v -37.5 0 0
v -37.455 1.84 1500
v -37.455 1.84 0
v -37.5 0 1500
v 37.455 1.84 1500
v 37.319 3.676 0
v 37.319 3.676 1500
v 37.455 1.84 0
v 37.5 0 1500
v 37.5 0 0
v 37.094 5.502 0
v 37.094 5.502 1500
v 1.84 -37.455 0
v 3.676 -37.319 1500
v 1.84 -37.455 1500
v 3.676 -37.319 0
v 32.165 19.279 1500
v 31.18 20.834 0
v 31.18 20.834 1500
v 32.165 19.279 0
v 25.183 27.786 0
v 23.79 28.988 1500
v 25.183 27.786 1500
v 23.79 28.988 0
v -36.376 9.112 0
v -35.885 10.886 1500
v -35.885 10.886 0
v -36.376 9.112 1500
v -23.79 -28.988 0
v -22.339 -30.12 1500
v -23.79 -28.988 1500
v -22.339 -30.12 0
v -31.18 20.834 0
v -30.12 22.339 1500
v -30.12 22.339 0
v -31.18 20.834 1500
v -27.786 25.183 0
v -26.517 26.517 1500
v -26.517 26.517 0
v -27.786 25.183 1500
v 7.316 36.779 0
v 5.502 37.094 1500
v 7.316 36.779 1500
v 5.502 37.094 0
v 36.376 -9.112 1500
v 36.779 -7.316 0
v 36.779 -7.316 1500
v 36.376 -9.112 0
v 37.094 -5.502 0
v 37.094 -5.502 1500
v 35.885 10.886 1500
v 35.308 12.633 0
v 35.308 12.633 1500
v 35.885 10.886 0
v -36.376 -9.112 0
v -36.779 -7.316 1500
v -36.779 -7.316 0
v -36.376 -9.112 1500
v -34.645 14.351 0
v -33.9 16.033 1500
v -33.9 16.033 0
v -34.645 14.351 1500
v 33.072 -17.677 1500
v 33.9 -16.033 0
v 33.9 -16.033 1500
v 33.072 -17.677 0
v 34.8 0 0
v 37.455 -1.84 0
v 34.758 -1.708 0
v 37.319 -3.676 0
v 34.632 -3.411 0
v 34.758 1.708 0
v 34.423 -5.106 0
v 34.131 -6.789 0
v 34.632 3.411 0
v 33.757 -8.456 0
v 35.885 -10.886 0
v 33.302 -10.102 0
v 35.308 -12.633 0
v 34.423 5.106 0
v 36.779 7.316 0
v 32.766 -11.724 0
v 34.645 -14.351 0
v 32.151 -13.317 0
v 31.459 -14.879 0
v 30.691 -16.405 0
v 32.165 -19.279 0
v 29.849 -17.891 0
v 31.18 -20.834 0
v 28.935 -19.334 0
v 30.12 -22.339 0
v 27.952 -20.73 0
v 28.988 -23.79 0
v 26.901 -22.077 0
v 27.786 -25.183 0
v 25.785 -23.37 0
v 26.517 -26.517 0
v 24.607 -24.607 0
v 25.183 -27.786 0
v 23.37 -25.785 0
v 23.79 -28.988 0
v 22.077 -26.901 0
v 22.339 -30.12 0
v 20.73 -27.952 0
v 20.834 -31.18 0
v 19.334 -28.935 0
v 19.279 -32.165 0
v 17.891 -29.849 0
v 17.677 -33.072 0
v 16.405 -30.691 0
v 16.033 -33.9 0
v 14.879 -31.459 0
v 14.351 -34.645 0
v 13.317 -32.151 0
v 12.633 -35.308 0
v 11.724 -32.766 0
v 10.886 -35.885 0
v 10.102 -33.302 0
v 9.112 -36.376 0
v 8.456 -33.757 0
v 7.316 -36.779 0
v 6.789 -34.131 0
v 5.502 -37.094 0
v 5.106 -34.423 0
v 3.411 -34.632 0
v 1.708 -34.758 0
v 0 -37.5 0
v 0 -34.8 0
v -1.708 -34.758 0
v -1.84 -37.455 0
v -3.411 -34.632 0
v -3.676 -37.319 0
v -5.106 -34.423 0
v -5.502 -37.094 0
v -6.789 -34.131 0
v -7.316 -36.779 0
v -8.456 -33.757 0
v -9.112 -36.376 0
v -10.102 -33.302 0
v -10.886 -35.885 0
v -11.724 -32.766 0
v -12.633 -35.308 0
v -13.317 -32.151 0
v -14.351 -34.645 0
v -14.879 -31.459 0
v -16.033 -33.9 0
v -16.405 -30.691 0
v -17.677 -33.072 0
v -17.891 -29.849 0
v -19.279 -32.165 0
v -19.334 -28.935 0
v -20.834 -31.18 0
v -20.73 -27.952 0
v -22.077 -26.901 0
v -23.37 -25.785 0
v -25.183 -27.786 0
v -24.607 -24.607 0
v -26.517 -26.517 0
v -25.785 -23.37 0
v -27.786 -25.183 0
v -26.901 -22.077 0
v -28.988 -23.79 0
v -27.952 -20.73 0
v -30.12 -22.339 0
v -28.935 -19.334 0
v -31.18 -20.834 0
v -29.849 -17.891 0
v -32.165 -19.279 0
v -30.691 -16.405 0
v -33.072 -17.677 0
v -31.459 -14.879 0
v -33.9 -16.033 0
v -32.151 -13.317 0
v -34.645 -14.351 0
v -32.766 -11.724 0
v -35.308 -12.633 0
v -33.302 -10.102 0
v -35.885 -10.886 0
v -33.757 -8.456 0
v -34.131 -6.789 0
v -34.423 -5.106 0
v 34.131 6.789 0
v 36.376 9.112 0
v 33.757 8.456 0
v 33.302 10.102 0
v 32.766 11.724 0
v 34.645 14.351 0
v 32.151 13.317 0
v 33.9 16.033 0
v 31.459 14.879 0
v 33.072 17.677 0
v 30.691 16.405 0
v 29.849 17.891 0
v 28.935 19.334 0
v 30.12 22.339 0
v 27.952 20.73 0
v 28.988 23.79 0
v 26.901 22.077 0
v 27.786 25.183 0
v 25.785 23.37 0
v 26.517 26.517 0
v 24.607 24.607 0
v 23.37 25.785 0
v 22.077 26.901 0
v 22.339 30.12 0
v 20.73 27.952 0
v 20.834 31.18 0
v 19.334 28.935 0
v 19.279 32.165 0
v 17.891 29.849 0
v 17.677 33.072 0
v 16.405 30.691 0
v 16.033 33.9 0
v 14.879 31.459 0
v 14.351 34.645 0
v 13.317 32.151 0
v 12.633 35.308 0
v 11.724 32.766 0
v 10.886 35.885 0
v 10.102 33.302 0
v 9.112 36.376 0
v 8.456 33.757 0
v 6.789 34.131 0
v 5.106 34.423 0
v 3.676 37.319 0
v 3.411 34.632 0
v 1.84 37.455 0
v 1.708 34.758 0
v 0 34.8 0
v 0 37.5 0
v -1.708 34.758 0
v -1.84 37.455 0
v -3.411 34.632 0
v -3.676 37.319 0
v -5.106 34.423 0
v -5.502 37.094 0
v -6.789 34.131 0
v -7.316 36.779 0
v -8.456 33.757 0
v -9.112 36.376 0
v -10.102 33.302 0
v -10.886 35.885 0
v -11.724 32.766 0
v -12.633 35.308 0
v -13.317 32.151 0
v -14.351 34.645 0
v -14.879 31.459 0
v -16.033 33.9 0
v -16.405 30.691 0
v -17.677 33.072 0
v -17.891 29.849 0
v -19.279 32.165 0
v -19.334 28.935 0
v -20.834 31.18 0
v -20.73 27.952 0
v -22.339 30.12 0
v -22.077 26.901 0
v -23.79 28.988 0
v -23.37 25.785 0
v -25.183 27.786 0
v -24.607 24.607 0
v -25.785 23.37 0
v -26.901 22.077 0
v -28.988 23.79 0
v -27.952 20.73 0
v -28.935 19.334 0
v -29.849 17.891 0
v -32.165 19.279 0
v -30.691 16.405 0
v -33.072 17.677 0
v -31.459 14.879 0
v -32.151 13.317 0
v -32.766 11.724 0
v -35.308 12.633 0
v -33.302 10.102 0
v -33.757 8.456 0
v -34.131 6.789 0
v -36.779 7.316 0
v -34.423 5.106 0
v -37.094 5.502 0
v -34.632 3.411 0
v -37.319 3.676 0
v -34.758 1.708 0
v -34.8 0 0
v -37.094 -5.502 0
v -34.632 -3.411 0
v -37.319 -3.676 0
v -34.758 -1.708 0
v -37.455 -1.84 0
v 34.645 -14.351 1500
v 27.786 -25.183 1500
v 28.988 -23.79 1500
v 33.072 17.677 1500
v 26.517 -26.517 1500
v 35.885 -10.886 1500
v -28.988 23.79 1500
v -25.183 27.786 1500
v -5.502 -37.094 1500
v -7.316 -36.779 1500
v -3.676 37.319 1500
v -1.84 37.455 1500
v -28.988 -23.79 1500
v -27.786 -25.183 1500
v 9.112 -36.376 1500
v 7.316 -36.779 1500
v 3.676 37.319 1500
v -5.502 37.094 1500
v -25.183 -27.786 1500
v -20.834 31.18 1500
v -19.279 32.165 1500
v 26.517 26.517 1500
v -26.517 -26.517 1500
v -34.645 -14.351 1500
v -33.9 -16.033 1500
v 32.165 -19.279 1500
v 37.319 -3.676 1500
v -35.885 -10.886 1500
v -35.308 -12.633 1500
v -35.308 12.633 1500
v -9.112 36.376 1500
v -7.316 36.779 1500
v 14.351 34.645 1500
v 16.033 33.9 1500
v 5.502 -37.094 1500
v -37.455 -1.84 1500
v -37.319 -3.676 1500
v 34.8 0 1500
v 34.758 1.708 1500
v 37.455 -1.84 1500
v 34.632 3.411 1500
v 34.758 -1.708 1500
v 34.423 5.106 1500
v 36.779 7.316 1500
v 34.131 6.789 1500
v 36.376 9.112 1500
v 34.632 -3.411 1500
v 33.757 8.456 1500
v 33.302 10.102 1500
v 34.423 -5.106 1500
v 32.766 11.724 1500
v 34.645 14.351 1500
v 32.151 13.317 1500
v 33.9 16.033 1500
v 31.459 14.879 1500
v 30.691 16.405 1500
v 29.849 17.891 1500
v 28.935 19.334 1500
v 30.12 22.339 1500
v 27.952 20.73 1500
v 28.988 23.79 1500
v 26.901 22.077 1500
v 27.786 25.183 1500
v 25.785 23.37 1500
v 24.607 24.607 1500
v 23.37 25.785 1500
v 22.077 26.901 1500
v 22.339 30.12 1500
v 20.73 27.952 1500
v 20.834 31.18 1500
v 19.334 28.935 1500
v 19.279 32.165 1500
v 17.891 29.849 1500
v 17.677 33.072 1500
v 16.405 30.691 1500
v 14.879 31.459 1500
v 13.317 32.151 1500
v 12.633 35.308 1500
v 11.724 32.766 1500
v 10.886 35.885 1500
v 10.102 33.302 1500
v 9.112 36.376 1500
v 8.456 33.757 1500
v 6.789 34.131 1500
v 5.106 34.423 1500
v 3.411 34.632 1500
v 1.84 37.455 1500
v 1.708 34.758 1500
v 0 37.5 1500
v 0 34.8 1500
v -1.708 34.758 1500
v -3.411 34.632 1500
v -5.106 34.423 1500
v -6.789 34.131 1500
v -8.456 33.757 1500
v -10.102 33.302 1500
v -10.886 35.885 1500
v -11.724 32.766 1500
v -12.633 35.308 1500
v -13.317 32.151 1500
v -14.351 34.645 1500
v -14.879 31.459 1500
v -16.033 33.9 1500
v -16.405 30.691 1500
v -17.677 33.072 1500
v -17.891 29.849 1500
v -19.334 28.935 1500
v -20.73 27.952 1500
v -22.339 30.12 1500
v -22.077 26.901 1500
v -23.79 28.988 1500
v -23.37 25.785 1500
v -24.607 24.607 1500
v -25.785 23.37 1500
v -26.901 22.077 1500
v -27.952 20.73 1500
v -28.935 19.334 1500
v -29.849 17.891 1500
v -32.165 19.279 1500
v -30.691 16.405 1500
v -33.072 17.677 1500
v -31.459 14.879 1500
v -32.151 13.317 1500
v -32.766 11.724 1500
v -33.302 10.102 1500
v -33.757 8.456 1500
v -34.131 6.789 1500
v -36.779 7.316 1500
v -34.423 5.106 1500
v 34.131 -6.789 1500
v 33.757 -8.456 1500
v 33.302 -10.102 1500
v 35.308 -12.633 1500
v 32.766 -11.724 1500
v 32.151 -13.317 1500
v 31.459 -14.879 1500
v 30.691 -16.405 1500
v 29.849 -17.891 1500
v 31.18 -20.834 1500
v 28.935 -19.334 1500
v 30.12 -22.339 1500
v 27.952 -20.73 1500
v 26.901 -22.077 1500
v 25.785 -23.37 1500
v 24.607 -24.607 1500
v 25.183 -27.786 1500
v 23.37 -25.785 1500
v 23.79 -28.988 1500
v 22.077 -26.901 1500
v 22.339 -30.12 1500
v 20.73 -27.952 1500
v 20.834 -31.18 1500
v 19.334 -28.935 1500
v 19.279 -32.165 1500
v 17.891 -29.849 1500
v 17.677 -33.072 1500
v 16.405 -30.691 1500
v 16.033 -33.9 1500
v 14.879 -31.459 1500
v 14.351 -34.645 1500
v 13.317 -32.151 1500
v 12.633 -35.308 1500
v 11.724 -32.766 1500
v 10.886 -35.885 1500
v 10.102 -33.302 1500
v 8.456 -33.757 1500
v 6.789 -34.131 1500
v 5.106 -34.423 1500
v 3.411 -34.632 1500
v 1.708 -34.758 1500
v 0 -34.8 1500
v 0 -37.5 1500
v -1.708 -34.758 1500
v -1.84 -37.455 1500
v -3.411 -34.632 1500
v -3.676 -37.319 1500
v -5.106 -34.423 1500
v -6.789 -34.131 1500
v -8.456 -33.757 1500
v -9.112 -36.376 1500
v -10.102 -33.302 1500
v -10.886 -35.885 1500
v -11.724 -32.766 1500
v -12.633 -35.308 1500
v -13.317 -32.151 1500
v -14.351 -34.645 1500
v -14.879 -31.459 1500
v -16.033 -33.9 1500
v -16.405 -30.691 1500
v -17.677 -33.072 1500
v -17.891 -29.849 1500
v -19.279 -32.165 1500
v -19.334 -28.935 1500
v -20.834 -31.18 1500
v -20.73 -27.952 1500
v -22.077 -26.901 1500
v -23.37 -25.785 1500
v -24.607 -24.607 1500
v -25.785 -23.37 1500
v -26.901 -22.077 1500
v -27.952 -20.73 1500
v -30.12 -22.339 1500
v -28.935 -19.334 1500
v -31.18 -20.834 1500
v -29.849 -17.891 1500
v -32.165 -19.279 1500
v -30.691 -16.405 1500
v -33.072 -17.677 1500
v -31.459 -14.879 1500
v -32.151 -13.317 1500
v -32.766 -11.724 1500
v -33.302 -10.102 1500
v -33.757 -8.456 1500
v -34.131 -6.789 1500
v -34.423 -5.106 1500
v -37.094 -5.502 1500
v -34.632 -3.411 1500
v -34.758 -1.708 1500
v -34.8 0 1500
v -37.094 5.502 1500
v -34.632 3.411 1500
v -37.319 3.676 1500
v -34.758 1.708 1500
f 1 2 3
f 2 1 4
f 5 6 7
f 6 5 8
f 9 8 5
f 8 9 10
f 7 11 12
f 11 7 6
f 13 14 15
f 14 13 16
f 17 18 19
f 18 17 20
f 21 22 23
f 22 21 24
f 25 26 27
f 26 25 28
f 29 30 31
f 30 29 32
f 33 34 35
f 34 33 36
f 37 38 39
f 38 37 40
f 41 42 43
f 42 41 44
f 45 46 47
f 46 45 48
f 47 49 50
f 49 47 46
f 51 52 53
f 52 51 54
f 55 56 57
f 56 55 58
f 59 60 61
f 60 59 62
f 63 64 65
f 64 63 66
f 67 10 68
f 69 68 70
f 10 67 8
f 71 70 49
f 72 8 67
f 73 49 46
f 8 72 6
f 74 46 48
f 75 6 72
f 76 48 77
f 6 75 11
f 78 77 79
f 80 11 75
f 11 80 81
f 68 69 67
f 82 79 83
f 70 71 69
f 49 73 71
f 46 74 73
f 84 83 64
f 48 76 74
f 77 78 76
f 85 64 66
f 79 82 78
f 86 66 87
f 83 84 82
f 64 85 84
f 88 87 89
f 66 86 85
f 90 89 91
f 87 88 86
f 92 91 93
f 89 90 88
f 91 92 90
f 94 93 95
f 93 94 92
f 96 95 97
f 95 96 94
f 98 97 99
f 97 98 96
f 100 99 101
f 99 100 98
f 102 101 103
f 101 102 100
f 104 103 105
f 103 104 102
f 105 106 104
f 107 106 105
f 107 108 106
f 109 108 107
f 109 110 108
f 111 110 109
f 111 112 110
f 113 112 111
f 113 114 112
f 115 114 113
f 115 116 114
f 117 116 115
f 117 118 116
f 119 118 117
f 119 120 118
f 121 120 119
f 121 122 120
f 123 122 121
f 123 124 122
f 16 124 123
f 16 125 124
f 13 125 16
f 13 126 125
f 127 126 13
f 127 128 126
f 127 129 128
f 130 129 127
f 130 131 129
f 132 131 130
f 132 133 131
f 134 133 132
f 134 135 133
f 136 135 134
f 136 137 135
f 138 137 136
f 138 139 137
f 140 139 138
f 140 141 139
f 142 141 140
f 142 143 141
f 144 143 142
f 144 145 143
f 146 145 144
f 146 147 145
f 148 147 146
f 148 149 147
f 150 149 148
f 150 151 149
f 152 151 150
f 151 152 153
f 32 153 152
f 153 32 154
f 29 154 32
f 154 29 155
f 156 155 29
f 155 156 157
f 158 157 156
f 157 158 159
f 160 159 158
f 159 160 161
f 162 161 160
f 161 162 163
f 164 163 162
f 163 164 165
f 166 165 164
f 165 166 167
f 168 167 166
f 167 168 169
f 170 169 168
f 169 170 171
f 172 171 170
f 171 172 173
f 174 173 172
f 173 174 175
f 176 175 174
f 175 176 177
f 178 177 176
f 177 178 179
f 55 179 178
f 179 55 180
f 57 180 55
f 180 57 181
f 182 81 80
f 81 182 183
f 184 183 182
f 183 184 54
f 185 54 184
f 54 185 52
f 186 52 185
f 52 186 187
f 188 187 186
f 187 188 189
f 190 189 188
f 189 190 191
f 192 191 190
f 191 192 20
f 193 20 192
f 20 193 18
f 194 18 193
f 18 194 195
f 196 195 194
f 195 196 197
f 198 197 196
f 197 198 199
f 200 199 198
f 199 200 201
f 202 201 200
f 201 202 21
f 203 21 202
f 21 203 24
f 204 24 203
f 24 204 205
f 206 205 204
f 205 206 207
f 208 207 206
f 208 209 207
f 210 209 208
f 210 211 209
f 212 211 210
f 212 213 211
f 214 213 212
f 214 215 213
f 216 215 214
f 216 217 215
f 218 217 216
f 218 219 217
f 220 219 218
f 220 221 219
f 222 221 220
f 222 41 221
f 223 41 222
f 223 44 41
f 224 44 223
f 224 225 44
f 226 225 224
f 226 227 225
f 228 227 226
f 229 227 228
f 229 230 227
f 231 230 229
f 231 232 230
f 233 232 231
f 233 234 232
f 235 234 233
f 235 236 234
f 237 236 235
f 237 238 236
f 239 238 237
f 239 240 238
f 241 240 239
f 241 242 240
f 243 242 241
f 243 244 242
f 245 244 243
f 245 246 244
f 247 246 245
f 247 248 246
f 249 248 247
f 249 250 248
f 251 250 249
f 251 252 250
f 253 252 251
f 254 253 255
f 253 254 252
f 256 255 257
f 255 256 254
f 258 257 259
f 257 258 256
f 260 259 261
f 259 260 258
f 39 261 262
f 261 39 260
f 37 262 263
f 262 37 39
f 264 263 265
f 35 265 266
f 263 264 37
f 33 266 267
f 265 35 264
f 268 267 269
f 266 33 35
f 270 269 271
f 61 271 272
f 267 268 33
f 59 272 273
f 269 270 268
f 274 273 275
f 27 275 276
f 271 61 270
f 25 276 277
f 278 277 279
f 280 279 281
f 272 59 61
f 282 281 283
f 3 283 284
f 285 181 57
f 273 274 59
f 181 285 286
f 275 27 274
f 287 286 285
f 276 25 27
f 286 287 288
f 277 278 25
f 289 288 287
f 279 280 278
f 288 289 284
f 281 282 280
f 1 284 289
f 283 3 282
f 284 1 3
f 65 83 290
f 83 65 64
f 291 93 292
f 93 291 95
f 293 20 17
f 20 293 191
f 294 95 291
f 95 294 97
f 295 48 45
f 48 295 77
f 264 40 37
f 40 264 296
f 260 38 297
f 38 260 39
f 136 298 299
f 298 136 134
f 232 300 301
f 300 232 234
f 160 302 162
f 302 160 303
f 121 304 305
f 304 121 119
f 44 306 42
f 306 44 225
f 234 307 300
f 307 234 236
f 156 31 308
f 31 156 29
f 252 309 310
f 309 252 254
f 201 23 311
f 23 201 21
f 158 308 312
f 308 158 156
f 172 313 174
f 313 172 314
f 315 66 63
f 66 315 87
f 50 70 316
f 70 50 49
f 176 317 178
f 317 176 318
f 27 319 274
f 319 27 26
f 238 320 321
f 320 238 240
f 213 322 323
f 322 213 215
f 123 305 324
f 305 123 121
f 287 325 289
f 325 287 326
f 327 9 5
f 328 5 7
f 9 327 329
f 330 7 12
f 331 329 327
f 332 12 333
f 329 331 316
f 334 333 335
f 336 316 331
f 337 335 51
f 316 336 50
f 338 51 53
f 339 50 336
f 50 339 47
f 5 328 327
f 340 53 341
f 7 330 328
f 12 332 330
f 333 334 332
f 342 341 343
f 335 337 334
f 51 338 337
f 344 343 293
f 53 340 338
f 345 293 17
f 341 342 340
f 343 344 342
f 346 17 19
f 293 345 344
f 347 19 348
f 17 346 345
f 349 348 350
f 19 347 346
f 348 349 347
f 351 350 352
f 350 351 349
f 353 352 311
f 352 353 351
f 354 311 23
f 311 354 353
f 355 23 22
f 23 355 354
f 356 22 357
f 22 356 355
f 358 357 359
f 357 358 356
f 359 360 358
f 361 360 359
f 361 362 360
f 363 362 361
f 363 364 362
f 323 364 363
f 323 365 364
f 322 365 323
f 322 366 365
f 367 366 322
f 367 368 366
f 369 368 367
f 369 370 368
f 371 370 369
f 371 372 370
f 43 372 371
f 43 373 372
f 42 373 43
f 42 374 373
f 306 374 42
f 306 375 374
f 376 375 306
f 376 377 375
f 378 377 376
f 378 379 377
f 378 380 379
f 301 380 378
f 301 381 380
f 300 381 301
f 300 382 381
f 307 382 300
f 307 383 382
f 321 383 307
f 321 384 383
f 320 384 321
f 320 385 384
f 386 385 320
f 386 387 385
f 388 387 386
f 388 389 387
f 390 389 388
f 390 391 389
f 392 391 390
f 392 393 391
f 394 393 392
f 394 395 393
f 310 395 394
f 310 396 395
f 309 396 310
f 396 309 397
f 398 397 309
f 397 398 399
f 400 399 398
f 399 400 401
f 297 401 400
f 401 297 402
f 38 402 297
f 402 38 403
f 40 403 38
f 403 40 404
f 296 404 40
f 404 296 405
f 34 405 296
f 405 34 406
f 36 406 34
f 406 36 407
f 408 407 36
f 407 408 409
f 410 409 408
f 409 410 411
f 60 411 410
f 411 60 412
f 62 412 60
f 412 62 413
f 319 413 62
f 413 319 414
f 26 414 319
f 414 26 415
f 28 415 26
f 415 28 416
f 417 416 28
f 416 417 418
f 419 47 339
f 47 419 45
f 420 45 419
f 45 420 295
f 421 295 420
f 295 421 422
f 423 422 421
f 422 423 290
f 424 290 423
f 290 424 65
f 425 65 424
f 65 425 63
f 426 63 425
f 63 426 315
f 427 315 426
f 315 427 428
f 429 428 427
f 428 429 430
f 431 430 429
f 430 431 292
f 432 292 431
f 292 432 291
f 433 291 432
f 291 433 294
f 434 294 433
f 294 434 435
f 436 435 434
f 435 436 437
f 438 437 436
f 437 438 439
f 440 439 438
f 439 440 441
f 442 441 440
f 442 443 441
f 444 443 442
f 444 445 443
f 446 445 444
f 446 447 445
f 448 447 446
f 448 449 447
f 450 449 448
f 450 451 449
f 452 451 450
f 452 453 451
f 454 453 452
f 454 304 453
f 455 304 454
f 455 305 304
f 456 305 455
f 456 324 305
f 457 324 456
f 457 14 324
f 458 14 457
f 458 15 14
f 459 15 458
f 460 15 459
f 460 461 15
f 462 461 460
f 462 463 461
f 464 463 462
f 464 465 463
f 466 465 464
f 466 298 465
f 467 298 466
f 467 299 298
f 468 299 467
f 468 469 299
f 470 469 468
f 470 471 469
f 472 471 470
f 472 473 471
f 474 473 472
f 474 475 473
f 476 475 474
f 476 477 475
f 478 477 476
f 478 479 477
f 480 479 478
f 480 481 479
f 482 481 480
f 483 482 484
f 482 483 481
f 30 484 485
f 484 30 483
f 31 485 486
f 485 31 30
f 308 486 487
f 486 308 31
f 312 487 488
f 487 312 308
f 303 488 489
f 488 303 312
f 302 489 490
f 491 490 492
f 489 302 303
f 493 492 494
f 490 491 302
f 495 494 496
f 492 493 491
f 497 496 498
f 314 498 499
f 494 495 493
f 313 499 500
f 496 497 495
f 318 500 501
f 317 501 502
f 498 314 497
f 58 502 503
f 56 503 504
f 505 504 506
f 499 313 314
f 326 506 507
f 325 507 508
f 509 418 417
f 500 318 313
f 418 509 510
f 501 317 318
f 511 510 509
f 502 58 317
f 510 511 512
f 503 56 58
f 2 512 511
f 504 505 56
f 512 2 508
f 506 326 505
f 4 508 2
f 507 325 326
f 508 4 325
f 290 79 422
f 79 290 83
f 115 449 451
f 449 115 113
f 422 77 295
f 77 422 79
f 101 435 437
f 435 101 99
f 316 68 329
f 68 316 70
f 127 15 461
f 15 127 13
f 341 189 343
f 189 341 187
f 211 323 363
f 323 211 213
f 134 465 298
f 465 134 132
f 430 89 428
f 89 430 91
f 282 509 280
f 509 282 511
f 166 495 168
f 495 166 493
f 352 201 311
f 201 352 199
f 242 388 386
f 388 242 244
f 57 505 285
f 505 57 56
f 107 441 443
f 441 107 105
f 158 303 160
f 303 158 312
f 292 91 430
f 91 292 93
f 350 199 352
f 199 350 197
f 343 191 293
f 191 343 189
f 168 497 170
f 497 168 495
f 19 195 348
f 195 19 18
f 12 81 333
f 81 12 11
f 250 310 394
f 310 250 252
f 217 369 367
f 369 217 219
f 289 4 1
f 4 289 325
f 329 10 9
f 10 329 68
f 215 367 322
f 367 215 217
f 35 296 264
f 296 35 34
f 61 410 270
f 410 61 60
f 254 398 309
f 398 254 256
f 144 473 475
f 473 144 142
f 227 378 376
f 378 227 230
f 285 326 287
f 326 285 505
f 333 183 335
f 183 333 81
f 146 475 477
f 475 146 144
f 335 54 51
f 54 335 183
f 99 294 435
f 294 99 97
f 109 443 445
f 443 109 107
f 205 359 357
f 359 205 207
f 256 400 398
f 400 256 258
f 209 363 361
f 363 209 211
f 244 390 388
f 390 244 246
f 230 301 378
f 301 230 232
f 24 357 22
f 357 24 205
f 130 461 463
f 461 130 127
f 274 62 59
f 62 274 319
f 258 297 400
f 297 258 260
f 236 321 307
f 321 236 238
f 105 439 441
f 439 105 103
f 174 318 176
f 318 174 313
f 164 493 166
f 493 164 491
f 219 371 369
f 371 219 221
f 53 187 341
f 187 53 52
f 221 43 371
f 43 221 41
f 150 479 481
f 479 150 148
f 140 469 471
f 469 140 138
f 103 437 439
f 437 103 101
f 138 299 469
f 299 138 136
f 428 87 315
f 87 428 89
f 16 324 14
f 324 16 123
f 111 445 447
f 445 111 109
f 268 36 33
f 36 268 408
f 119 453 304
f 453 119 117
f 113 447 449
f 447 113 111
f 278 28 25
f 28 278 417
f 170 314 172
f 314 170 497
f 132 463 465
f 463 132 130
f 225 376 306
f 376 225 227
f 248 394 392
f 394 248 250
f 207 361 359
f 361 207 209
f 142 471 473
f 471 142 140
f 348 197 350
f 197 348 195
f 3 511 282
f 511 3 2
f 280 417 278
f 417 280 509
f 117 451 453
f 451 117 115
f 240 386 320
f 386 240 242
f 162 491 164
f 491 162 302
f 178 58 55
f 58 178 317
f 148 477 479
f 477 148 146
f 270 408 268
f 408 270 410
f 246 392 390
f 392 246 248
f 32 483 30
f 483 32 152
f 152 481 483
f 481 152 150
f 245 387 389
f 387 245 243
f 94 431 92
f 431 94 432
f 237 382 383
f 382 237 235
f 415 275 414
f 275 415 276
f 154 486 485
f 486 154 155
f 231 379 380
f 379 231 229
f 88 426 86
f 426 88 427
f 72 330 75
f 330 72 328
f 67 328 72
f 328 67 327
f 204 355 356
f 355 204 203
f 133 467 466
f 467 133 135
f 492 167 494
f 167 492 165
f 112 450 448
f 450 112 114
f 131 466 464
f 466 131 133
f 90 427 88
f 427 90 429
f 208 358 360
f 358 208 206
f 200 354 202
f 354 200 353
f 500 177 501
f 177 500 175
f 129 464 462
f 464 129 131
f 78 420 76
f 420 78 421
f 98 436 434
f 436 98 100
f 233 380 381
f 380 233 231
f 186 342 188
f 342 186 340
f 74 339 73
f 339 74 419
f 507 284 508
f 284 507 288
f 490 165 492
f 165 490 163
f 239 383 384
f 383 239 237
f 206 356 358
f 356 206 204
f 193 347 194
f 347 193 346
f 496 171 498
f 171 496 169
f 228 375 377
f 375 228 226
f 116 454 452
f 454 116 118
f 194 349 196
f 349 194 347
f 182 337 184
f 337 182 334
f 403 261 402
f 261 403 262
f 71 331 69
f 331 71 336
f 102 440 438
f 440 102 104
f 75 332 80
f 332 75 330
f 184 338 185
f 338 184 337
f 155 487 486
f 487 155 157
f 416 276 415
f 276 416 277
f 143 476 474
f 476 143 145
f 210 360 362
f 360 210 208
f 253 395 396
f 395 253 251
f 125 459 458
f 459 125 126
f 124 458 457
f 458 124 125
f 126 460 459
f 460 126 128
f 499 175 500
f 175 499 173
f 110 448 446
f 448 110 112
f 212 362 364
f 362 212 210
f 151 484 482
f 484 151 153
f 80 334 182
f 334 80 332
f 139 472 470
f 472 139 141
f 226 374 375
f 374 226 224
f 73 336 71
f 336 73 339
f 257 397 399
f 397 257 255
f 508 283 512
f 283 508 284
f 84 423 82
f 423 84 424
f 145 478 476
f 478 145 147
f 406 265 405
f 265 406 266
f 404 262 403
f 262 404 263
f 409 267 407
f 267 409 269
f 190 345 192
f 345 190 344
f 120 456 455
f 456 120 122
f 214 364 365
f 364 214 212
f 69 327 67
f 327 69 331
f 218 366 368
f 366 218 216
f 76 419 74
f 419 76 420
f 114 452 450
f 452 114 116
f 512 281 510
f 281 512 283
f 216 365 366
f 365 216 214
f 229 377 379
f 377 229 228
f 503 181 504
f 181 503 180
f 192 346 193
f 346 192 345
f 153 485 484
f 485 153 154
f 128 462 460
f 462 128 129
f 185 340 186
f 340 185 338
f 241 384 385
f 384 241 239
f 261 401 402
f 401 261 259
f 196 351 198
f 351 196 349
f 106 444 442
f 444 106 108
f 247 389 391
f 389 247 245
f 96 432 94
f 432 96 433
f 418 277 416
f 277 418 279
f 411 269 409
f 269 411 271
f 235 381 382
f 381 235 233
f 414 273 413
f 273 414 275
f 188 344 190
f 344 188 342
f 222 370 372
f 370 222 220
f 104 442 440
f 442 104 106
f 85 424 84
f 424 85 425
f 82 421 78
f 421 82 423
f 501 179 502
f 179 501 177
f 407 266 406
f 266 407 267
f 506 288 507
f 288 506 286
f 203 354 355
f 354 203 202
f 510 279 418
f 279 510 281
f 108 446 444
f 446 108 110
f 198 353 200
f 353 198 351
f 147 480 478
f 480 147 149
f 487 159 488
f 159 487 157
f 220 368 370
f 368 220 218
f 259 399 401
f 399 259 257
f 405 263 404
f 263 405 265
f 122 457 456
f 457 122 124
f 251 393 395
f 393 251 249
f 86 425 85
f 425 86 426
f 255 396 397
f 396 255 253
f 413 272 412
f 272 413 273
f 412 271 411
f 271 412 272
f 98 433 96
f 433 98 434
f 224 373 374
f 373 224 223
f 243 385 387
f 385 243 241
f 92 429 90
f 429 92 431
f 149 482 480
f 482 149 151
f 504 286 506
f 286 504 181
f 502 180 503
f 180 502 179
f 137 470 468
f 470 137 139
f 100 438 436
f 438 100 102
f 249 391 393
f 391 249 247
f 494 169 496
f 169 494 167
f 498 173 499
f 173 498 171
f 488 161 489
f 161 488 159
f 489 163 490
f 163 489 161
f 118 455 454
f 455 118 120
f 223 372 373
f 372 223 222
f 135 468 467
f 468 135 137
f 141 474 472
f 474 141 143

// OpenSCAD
$fn = 128;

// HT pipe parameters (approximate for HT 75)
od = 75;          // outer diameter (mm)
wall = 2.7;       // wall thickness (mm) typical for HT 75
len = 1500;       // length (mm)

id = od - 2*wall;

module ht_pipe(od, id, len) {
    difference() {
        cylinder(h = len, d = od, center = false);
        translate([0,0,-0.5])
            cylinder(h = len + 1, d = id, center = false);
    }
}

ht_pipe(od, id, len);
